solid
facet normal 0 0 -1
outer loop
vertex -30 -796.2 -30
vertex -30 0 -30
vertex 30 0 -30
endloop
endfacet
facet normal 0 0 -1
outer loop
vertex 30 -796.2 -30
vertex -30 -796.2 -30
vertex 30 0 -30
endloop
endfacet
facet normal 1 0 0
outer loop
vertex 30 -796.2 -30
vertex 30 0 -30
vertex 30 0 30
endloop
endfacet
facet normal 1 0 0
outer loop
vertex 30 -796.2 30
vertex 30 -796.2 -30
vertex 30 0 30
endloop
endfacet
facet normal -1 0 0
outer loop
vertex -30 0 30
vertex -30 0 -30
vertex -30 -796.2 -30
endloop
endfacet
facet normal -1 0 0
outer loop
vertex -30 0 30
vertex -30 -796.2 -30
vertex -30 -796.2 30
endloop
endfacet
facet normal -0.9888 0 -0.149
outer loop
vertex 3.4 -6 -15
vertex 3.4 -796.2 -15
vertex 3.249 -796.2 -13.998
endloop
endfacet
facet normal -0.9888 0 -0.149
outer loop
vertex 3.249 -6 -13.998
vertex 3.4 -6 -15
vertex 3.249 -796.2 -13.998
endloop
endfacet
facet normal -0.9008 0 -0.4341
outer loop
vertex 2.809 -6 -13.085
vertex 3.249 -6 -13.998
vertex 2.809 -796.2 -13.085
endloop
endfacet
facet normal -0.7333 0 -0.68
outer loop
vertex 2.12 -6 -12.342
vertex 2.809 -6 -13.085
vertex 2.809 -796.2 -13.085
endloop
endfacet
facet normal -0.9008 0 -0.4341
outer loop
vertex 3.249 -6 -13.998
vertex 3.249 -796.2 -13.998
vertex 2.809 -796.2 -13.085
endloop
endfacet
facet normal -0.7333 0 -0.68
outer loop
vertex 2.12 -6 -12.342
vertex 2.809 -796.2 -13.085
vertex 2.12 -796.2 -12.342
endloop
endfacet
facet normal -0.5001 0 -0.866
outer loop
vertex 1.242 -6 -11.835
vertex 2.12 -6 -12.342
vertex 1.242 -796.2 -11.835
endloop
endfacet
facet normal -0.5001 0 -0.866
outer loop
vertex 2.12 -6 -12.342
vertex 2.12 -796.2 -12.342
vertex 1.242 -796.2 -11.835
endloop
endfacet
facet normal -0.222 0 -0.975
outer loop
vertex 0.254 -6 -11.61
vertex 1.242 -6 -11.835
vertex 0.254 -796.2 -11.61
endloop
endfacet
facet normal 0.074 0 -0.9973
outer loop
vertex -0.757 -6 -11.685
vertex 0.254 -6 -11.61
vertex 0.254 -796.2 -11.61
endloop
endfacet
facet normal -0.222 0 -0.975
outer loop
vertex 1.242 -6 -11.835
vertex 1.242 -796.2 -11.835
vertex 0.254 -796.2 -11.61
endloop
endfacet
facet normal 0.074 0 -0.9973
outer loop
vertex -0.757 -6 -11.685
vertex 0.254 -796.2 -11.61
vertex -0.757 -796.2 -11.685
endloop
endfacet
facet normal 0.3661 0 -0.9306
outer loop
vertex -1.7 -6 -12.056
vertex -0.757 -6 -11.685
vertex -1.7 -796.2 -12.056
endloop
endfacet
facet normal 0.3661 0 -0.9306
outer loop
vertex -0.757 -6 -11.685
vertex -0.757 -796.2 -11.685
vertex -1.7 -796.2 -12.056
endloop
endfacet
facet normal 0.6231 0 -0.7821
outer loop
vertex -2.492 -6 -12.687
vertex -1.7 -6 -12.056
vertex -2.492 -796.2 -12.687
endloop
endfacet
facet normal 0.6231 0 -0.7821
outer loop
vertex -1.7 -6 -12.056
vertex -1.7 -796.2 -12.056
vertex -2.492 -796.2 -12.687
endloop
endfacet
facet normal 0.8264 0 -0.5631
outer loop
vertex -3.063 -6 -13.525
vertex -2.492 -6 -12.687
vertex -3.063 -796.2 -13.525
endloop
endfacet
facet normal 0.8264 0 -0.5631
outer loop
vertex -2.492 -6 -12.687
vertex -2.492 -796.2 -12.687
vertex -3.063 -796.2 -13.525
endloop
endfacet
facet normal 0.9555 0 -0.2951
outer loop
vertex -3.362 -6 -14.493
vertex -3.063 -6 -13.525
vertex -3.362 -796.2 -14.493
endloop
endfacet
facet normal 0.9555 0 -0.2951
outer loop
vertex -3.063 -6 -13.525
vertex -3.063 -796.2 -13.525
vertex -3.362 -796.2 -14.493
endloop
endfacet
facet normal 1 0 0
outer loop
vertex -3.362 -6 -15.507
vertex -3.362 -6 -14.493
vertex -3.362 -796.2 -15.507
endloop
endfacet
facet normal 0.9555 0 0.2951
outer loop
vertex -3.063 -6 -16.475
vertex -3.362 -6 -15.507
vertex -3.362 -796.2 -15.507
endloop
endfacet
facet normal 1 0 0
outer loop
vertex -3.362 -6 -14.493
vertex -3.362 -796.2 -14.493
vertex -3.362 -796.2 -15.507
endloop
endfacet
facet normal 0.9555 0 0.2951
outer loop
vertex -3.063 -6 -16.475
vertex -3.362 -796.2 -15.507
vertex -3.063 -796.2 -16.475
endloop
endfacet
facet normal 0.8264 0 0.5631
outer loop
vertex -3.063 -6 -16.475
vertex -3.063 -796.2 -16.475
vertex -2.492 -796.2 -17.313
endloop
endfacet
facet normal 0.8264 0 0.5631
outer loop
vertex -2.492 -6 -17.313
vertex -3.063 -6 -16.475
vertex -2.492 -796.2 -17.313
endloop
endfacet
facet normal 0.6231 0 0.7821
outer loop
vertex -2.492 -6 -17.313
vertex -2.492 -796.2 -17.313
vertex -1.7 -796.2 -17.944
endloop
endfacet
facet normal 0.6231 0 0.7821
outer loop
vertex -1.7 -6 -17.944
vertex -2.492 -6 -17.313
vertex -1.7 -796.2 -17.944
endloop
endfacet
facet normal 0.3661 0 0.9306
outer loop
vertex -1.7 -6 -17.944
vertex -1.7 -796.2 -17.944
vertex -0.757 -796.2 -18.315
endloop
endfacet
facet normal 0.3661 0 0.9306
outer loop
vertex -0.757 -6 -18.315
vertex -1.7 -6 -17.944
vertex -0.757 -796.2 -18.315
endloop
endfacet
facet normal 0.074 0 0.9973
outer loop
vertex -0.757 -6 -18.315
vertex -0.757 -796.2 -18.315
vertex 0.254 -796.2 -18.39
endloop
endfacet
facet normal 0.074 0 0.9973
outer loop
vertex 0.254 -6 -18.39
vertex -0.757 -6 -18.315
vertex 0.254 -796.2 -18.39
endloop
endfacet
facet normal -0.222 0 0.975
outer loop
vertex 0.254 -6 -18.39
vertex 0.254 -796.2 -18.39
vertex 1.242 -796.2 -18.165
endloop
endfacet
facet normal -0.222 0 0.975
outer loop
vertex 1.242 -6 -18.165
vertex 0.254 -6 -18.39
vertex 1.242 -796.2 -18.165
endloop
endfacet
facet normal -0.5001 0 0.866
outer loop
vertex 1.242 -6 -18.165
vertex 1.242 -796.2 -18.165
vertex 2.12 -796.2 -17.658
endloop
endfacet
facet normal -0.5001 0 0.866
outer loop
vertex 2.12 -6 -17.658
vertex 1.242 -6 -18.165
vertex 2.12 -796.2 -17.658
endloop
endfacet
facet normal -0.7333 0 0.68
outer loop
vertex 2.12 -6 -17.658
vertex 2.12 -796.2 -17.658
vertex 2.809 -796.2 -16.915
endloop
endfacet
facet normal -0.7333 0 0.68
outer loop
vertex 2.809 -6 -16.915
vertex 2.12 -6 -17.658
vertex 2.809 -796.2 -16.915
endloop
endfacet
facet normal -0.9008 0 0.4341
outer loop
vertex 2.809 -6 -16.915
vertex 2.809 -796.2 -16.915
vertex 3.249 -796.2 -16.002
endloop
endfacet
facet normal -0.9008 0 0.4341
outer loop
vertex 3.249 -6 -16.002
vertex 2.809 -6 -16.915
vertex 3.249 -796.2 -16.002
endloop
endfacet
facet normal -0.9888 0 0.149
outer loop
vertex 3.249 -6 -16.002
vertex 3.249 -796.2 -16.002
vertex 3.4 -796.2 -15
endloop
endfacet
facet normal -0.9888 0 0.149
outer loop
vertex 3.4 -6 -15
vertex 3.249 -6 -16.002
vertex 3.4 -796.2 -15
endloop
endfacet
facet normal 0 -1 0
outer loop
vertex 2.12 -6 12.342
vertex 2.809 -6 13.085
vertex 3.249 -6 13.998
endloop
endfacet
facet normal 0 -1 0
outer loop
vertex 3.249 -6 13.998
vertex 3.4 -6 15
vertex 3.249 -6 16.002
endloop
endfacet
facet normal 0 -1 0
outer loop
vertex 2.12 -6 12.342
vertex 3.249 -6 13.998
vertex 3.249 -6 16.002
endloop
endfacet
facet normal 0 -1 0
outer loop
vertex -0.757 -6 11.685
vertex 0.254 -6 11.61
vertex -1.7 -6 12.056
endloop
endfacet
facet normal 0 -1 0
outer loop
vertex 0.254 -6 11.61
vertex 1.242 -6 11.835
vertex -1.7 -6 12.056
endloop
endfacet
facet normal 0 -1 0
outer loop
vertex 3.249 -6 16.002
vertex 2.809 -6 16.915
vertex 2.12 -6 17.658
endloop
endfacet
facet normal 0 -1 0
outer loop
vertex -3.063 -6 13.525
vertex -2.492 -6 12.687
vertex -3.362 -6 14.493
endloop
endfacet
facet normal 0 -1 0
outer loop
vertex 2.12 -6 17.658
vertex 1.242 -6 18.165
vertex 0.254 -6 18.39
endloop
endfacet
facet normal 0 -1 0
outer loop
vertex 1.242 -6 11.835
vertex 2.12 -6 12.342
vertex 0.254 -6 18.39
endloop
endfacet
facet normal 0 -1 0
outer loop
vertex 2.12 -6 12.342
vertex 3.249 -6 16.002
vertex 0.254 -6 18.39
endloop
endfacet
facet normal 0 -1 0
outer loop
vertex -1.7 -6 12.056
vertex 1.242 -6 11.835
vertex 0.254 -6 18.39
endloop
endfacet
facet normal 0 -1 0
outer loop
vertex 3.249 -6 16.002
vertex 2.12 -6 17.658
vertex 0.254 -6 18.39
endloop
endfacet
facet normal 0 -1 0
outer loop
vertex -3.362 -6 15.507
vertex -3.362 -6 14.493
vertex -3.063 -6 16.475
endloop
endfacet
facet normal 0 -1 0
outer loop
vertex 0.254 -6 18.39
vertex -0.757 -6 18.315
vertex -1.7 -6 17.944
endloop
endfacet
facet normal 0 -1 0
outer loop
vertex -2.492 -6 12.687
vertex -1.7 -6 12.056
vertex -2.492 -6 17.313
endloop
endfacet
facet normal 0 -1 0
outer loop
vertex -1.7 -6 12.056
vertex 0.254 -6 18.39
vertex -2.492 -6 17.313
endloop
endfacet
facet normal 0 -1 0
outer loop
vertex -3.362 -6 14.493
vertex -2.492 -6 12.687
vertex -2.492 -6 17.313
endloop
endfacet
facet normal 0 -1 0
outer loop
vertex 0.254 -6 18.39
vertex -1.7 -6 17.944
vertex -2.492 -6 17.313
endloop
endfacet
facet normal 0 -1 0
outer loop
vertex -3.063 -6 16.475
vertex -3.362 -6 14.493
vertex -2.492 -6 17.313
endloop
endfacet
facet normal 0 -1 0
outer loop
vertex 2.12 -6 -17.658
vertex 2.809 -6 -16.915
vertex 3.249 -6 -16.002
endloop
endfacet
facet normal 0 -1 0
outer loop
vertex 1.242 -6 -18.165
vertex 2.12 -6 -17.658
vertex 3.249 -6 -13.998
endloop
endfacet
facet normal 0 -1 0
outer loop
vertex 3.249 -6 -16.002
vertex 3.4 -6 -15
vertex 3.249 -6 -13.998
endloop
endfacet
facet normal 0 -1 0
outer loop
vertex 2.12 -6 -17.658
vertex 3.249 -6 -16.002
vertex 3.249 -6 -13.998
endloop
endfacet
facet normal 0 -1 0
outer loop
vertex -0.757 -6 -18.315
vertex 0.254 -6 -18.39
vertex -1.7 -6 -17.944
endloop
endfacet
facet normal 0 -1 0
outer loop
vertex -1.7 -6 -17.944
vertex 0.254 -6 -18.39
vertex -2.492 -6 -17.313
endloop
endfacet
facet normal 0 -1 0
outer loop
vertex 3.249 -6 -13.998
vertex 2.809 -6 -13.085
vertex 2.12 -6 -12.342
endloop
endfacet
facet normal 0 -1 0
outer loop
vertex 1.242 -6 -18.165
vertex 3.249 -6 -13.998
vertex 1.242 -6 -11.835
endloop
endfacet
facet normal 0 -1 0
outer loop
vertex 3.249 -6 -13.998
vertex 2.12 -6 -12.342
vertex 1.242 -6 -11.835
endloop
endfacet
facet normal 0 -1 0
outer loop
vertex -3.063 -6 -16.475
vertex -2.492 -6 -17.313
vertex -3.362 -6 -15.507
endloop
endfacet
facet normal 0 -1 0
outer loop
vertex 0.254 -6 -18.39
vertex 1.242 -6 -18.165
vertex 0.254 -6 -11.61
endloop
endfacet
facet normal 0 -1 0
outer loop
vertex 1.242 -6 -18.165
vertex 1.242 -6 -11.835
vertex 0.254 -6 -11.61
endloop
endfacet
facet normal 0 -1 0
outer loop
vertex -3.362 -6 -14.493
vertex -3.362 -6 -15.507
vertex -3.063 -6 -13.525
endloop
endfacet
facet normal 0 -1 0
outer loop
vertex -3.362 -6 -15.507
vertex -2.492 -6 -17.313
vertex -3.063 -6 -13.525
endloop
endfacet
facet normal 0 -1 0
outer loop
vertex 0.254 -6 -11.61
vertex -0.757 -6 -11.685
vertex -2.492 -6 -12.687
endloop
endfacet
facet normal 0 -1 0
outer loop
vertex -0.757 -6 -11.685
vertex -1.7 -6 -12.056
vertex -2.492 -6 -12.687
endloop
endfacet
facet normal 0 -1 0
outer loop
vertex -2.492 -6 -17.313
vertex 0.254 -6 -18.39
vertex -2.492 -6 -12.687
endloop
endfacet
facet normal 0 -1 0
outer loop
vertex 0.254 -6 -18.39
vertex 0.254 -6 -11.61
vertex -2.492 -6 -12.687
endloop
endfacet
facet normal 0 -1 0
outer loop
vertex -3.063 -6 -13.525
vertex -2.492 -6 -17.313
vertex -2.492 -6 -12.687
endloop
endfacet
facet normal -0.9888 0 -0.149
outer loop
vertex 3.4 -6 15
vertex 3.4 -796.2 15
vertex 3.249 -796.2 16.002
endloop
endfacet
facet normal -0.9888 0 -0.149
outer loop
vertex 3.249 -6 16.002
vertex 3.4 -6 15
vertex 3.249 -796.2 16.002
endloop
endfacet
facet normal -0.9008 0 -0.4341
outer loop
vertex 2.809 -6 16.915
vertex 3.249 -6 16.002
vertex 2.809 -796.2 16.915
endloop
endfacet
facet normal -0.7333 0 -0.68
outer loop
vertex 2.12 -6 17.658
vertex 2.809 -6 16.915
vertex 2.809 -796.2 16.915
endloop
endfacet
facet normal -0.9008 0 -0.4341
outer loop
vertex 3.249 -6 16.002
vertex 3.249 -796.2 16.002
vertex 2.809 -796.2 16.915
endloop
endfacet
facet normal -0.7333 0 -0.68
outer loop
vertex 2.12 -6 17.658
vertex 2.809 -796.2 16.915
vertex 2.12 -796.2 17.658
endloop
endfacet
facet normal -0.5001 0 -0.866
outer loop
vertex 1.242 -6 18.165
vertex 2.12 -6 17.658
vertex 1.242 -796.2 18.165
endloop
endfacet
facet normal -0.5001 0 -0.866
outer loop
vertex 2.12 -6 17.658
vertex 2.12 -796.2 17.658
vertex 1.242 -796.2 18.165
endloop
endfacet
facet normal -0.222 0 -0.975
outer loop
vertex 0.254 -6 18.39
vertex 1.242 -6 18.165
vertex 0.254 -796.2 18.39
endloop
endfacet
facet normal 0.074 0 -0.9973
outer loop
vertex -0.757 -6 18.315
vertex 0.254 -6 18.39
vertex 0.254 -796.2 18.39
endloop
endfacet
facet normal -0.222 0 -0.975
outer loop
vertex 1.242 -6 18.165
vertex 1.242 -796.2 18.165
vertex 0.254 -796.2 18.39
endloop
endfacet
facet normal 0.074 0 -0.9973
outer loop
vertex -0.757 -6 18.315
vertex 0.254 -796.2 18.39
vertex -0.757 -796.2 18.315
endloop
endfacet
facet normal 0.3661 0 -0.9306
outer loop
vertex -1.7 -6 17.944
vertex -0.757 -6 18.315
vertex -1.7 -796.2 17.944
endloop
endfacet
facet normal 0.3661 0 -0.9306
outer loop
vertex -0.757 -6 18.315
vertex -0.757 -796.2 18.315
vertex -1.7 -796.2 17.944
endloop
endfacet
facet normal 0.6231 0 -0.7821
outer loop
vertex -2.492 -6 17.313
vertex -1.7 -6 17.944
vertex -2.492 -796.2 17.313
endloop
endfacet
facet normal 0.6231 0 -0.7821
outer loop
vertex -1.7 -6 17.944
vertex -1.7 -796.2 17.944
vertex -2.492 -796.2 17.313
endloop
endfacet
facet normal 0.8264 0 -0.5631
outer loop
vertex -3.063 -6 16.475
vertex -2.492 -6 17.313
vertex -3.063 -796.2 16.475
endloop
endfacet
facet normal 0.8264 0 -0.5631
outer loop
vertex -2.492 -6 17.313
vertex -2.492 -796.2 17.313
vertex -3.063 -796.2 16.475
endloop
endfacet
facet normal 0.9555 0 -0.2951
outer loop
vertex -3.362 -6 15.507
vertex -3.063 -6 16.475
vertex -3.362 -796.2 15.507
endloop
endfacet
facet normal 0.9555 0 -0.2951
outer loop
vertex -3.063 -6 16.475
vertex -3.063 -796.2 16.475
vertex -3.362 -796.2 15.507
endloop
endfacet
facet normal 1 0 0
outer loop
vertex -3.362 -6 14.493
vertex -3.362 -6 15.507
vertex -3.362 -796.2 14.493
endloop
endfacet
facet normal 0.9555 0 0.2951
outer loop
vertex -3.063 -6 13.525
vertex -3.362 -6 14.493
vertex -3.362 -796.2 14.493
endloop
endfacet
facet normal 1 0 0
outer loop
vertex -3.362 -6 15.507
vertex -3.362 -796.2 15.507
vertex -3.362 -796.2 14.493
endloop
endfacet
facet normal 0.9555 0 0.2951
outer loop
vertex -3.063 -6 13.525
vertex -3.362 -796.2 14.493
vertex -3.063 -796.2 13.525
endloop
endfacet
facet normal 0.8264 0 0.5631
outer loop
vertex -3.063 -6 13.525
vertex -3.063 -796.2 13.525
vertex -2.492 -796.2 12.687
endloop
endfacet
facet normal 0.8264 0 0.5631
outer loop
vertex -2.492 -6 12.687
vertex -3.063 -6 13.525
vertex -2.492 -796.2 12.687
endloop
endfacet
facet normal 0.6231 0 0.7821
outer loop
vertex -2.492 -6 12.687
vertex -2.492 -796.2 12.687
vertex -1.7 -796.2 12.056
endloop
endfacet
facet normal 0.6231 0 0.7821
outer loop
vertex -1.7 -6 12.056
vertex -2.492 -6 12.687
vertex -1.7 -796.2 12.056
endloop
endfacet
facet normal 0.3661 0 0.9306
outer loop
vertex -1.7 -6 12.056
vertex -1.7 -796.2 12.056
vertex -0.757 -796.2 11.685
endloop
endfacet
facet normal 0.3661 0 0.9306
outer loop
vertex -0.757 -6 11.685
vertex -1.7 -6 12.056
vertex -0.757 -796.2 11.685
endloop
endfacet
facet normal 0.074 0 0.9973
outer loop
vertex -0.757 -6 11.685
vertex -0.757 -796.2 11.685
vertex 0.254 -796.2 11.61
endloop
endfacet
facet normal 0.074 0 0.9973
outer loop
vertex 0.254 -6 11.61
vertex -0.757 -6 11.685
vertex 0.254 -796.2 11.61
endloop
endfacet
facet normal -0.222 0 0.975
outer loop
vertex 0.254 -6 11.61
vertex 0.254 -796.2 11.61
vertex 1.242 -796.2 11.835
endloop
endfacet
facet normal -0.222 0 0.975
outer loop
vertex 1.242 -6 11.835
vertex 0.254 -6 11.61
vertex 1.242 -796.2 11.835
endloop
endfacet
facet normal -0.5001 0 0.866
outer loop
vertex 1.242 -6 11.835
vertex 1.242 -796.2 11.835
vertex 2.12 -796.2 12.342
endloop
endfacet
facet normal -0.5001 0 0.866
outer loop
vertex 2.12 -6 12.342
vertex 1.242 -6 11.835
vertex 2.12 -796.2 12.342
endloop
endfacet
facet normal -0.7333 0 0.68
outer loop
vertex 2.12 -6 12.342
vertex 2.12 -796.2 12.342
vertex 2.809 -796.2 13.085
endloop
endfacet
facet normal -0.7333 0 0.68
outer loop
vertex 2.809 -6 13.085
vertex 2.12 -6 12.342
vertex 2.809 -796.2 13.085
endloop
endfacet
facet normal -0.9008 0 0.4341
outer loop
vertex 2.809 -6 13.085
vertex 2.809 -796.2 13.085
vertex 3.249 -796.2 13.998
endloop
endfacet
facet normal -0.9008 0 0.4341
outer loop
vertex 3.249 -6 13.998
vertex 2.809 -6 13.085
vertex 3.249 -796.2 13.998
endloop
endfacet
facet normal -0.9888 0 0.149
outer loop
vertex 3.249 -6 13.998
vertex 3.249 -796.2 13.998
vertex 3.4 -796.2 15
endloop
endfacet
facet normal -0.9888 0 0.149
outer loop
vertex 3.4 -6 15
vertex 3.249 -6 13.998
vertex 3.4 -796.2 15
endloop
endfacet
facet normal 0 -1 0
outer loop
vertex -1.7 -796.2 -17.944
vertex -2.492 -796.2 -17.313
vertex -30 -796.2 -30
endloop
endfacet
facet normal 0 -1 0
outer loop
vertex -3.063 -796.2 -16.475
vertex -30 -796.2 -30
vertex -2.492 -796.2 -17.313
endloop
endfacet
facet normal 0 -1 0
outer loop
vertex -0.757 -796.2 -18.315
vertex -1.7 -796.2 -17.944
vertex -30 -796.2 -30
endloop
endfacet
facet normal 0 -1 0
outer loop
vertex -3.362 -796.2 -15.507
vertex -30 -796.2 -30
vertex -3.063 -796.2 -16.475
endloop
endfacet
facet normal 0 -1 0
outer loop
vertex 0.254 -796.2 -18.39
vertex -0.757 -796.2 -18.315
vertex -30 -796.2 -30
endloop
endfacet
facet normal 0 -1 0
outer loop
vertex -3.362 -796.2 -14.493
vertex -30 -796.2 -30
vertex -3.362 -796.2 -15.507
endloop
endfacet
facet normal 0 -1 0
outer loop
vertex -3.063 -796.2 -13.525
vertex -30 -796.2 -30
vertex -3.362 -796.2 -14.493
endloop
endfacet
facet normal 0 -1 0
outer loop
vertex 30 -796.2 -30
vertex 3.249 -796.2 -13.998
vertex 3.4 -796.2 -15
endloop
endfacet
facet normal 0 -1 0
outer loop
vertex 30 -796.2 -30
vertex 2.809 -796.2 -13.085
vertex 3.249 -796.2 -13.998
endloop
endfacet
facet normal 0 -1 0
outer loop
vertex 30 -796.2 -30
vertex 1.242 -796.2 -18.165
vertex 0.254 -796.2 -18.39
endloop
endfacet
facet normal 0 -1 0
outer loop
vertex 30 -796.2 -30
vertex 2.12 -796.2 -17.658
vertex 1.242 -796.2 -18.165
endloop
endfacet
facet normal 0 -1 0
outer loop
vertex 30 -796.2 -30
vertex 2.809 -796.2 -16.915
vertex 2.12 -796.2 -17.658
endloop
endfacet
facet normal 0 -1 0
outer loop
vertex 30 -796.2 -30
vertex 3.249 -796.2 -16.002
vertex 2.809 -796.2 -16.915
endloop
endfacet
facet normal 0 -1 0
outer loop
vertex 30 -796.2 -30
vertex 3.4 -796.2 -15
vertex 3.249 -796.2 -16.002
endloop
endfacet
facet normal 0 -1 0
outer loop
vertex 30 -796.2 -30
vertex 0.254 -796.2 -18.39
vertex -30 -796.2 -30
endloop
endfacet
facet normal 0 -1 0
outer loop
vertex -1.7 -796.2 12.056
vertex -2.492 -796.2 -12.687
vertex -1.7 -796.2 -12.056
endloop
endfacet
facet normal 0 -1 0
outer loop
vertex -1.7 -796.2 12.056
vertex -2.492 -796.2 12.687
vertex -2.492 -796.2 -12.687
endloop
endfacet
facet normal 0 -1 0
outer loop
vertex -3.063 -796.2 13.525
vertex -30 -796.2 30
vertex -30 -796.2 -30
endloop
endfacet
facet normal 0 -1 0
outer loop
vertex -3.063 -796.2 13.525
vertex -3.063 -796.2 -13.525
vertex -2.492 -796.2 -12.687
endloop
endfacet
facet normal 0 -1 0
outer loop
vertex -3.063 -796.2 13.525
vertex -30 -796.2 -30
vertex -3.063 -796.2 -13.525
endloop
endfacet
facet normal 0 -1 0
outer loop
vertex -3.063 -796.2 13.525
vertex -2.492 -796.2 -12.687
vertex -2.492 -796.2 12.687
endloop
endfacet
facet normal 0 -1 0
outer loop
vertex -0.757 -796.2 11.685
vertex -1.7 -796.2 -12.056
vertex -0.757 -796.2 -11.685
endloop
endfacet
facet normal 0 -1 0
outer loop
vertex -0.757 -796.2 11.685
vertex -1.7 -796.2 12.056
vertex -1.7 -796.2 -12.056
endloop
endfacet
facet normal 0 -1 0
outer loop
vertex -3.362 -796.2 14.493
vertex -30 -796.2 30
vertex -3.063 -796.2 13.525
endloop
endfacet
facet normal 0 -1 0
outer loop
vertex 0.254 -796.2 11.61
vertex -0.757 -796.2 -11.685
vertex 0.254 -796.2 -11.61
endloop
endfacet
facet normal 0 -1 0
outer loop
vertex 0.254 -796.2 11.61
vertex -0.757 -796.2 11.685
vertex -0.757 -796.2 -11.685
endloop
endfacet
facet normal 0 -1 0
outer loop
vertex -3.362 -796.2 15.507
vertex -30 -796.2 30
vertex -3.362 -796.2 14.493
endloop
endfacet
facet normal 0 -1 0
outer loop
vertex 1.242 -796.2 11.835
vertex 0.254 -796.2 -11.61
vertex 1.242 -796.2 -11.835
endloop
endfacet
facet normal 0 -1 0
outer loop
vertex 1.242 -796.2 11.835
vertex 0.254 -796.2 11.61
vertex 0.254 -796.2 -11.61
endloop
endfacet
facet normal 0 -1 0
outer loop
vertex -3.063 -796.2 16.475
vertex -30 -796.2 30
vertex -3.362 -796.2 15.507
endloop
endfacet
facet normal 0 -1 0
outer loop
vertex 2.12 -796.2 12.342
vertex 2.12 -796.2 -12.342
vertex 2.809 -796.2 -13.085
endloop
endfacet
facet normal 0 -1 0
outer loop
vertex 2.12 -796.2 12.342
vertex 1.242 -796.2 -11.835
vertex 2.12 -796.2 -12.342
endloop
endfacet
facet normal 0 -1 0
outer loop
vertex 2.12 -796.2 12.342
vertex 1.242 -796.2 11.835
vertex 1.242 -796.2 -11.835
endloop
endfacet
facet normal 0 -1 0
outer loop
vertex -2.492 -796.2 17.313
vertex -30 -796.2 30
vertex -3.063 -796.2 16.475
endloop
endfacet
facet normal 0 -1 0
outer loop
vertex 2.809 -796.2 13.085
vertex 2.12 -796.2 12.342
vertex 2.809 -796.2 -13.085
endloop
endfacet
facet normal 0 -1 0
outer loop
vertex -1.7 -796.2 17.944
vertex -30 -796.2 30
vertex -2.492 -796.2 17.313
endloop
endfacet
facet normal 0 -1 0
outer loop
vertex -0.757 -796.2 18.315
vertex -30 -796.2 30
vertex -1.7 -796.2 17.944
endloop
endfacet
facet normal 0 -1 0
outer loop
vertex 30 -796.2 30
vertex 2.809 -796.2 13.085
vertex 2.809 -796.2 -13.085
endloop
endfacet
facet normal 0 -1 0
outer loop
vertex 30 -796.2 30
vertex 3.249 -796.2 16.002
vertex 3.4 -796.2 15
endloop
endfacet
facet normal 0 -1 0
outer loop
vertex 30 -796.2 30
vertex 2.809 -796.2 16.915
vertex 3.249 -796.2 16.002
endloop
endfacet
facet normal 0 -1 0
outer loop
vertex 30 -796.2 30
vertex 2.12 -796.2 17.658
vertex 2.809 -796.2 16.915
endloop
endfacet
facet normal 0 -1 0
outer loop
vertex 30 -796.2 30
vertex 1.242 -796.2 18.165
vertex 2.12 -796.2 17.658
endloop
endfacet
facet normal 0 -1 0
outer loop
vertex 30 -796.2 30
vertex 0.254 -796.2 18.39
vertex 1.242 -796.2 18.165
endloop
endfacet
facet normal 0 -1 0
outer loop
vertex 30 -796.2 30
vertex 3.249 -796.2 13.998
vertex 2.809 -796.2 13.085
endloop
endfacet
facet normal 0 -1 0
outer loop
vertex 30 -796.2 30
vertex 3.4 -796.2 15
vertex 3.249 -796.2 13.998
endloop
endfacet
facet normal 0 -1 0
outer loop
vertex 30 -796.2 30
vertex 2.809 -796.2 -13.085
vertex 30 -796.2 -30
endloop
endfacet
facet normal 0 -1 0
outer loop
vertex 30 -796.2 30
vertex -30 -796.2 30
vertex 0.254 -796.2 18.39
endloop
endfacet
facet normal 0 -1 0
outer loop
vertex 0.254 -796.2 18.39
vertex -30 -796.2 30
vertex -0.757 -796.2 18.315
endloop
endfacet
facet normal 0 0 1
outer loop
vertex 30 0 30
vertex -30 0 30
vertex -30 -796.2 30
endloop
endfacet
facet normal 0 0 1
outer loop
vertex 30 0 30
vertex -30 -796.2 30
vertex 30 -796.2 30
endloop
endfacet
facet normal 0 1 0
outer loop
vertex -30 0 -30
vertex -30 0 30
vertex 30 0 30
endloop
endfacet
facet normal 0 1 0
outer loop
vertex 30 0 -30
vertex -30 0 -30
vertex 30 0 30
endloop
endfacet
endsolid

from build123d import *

# Parameters (mm, degrees)
F0_W     = 60
F0_H     = 60
F1_DEPTH = 796.2
F2_W     = 60
F2_H     = 60
F3_DEPTH = 6
F4_R     = 3.4
F5_DEPTH = 796.201
F6_W     = 60
F6_H     = 60
F7_DEPTH = 6


with BuildPart() as f1:
    # F0 (on Front) → F1 (new body)
    with BuildSketch(Plane.XZ):
        Rectangle(F0_W, F0_H)
    extrude(amount=F1_DEPTH)

    # F2 (on face) → F3 (join)
    with BuildSketch(Plane.XZ.offset(796.2)):
        Rectangle(F2_W, F2_H)
    extrude(amount=-F3_DEPTH)

    # F4 (on face) → F5 (cut, through all)
    with BuildSketch(Plane.XZ.offset(796.2)):
        with Locations((0, 15)):
            Circle(F4_R)
        with Locations((0, -15)):
            Circle(F4_R)
    extrude(amount=-F5_DEPTH, mode=Mode.SUBTRACT)

    # F6 (on face) → F7 (join)
    with BuildSketch(Plane(origin=(0, 0, 0), x_dir=(-1, 0, 0), z_dir=(0, 1, 0))):
        Rectangle(F6_W, F6_H)
    extrude(amount=-F7_DEPTH)


solid = f1.part
